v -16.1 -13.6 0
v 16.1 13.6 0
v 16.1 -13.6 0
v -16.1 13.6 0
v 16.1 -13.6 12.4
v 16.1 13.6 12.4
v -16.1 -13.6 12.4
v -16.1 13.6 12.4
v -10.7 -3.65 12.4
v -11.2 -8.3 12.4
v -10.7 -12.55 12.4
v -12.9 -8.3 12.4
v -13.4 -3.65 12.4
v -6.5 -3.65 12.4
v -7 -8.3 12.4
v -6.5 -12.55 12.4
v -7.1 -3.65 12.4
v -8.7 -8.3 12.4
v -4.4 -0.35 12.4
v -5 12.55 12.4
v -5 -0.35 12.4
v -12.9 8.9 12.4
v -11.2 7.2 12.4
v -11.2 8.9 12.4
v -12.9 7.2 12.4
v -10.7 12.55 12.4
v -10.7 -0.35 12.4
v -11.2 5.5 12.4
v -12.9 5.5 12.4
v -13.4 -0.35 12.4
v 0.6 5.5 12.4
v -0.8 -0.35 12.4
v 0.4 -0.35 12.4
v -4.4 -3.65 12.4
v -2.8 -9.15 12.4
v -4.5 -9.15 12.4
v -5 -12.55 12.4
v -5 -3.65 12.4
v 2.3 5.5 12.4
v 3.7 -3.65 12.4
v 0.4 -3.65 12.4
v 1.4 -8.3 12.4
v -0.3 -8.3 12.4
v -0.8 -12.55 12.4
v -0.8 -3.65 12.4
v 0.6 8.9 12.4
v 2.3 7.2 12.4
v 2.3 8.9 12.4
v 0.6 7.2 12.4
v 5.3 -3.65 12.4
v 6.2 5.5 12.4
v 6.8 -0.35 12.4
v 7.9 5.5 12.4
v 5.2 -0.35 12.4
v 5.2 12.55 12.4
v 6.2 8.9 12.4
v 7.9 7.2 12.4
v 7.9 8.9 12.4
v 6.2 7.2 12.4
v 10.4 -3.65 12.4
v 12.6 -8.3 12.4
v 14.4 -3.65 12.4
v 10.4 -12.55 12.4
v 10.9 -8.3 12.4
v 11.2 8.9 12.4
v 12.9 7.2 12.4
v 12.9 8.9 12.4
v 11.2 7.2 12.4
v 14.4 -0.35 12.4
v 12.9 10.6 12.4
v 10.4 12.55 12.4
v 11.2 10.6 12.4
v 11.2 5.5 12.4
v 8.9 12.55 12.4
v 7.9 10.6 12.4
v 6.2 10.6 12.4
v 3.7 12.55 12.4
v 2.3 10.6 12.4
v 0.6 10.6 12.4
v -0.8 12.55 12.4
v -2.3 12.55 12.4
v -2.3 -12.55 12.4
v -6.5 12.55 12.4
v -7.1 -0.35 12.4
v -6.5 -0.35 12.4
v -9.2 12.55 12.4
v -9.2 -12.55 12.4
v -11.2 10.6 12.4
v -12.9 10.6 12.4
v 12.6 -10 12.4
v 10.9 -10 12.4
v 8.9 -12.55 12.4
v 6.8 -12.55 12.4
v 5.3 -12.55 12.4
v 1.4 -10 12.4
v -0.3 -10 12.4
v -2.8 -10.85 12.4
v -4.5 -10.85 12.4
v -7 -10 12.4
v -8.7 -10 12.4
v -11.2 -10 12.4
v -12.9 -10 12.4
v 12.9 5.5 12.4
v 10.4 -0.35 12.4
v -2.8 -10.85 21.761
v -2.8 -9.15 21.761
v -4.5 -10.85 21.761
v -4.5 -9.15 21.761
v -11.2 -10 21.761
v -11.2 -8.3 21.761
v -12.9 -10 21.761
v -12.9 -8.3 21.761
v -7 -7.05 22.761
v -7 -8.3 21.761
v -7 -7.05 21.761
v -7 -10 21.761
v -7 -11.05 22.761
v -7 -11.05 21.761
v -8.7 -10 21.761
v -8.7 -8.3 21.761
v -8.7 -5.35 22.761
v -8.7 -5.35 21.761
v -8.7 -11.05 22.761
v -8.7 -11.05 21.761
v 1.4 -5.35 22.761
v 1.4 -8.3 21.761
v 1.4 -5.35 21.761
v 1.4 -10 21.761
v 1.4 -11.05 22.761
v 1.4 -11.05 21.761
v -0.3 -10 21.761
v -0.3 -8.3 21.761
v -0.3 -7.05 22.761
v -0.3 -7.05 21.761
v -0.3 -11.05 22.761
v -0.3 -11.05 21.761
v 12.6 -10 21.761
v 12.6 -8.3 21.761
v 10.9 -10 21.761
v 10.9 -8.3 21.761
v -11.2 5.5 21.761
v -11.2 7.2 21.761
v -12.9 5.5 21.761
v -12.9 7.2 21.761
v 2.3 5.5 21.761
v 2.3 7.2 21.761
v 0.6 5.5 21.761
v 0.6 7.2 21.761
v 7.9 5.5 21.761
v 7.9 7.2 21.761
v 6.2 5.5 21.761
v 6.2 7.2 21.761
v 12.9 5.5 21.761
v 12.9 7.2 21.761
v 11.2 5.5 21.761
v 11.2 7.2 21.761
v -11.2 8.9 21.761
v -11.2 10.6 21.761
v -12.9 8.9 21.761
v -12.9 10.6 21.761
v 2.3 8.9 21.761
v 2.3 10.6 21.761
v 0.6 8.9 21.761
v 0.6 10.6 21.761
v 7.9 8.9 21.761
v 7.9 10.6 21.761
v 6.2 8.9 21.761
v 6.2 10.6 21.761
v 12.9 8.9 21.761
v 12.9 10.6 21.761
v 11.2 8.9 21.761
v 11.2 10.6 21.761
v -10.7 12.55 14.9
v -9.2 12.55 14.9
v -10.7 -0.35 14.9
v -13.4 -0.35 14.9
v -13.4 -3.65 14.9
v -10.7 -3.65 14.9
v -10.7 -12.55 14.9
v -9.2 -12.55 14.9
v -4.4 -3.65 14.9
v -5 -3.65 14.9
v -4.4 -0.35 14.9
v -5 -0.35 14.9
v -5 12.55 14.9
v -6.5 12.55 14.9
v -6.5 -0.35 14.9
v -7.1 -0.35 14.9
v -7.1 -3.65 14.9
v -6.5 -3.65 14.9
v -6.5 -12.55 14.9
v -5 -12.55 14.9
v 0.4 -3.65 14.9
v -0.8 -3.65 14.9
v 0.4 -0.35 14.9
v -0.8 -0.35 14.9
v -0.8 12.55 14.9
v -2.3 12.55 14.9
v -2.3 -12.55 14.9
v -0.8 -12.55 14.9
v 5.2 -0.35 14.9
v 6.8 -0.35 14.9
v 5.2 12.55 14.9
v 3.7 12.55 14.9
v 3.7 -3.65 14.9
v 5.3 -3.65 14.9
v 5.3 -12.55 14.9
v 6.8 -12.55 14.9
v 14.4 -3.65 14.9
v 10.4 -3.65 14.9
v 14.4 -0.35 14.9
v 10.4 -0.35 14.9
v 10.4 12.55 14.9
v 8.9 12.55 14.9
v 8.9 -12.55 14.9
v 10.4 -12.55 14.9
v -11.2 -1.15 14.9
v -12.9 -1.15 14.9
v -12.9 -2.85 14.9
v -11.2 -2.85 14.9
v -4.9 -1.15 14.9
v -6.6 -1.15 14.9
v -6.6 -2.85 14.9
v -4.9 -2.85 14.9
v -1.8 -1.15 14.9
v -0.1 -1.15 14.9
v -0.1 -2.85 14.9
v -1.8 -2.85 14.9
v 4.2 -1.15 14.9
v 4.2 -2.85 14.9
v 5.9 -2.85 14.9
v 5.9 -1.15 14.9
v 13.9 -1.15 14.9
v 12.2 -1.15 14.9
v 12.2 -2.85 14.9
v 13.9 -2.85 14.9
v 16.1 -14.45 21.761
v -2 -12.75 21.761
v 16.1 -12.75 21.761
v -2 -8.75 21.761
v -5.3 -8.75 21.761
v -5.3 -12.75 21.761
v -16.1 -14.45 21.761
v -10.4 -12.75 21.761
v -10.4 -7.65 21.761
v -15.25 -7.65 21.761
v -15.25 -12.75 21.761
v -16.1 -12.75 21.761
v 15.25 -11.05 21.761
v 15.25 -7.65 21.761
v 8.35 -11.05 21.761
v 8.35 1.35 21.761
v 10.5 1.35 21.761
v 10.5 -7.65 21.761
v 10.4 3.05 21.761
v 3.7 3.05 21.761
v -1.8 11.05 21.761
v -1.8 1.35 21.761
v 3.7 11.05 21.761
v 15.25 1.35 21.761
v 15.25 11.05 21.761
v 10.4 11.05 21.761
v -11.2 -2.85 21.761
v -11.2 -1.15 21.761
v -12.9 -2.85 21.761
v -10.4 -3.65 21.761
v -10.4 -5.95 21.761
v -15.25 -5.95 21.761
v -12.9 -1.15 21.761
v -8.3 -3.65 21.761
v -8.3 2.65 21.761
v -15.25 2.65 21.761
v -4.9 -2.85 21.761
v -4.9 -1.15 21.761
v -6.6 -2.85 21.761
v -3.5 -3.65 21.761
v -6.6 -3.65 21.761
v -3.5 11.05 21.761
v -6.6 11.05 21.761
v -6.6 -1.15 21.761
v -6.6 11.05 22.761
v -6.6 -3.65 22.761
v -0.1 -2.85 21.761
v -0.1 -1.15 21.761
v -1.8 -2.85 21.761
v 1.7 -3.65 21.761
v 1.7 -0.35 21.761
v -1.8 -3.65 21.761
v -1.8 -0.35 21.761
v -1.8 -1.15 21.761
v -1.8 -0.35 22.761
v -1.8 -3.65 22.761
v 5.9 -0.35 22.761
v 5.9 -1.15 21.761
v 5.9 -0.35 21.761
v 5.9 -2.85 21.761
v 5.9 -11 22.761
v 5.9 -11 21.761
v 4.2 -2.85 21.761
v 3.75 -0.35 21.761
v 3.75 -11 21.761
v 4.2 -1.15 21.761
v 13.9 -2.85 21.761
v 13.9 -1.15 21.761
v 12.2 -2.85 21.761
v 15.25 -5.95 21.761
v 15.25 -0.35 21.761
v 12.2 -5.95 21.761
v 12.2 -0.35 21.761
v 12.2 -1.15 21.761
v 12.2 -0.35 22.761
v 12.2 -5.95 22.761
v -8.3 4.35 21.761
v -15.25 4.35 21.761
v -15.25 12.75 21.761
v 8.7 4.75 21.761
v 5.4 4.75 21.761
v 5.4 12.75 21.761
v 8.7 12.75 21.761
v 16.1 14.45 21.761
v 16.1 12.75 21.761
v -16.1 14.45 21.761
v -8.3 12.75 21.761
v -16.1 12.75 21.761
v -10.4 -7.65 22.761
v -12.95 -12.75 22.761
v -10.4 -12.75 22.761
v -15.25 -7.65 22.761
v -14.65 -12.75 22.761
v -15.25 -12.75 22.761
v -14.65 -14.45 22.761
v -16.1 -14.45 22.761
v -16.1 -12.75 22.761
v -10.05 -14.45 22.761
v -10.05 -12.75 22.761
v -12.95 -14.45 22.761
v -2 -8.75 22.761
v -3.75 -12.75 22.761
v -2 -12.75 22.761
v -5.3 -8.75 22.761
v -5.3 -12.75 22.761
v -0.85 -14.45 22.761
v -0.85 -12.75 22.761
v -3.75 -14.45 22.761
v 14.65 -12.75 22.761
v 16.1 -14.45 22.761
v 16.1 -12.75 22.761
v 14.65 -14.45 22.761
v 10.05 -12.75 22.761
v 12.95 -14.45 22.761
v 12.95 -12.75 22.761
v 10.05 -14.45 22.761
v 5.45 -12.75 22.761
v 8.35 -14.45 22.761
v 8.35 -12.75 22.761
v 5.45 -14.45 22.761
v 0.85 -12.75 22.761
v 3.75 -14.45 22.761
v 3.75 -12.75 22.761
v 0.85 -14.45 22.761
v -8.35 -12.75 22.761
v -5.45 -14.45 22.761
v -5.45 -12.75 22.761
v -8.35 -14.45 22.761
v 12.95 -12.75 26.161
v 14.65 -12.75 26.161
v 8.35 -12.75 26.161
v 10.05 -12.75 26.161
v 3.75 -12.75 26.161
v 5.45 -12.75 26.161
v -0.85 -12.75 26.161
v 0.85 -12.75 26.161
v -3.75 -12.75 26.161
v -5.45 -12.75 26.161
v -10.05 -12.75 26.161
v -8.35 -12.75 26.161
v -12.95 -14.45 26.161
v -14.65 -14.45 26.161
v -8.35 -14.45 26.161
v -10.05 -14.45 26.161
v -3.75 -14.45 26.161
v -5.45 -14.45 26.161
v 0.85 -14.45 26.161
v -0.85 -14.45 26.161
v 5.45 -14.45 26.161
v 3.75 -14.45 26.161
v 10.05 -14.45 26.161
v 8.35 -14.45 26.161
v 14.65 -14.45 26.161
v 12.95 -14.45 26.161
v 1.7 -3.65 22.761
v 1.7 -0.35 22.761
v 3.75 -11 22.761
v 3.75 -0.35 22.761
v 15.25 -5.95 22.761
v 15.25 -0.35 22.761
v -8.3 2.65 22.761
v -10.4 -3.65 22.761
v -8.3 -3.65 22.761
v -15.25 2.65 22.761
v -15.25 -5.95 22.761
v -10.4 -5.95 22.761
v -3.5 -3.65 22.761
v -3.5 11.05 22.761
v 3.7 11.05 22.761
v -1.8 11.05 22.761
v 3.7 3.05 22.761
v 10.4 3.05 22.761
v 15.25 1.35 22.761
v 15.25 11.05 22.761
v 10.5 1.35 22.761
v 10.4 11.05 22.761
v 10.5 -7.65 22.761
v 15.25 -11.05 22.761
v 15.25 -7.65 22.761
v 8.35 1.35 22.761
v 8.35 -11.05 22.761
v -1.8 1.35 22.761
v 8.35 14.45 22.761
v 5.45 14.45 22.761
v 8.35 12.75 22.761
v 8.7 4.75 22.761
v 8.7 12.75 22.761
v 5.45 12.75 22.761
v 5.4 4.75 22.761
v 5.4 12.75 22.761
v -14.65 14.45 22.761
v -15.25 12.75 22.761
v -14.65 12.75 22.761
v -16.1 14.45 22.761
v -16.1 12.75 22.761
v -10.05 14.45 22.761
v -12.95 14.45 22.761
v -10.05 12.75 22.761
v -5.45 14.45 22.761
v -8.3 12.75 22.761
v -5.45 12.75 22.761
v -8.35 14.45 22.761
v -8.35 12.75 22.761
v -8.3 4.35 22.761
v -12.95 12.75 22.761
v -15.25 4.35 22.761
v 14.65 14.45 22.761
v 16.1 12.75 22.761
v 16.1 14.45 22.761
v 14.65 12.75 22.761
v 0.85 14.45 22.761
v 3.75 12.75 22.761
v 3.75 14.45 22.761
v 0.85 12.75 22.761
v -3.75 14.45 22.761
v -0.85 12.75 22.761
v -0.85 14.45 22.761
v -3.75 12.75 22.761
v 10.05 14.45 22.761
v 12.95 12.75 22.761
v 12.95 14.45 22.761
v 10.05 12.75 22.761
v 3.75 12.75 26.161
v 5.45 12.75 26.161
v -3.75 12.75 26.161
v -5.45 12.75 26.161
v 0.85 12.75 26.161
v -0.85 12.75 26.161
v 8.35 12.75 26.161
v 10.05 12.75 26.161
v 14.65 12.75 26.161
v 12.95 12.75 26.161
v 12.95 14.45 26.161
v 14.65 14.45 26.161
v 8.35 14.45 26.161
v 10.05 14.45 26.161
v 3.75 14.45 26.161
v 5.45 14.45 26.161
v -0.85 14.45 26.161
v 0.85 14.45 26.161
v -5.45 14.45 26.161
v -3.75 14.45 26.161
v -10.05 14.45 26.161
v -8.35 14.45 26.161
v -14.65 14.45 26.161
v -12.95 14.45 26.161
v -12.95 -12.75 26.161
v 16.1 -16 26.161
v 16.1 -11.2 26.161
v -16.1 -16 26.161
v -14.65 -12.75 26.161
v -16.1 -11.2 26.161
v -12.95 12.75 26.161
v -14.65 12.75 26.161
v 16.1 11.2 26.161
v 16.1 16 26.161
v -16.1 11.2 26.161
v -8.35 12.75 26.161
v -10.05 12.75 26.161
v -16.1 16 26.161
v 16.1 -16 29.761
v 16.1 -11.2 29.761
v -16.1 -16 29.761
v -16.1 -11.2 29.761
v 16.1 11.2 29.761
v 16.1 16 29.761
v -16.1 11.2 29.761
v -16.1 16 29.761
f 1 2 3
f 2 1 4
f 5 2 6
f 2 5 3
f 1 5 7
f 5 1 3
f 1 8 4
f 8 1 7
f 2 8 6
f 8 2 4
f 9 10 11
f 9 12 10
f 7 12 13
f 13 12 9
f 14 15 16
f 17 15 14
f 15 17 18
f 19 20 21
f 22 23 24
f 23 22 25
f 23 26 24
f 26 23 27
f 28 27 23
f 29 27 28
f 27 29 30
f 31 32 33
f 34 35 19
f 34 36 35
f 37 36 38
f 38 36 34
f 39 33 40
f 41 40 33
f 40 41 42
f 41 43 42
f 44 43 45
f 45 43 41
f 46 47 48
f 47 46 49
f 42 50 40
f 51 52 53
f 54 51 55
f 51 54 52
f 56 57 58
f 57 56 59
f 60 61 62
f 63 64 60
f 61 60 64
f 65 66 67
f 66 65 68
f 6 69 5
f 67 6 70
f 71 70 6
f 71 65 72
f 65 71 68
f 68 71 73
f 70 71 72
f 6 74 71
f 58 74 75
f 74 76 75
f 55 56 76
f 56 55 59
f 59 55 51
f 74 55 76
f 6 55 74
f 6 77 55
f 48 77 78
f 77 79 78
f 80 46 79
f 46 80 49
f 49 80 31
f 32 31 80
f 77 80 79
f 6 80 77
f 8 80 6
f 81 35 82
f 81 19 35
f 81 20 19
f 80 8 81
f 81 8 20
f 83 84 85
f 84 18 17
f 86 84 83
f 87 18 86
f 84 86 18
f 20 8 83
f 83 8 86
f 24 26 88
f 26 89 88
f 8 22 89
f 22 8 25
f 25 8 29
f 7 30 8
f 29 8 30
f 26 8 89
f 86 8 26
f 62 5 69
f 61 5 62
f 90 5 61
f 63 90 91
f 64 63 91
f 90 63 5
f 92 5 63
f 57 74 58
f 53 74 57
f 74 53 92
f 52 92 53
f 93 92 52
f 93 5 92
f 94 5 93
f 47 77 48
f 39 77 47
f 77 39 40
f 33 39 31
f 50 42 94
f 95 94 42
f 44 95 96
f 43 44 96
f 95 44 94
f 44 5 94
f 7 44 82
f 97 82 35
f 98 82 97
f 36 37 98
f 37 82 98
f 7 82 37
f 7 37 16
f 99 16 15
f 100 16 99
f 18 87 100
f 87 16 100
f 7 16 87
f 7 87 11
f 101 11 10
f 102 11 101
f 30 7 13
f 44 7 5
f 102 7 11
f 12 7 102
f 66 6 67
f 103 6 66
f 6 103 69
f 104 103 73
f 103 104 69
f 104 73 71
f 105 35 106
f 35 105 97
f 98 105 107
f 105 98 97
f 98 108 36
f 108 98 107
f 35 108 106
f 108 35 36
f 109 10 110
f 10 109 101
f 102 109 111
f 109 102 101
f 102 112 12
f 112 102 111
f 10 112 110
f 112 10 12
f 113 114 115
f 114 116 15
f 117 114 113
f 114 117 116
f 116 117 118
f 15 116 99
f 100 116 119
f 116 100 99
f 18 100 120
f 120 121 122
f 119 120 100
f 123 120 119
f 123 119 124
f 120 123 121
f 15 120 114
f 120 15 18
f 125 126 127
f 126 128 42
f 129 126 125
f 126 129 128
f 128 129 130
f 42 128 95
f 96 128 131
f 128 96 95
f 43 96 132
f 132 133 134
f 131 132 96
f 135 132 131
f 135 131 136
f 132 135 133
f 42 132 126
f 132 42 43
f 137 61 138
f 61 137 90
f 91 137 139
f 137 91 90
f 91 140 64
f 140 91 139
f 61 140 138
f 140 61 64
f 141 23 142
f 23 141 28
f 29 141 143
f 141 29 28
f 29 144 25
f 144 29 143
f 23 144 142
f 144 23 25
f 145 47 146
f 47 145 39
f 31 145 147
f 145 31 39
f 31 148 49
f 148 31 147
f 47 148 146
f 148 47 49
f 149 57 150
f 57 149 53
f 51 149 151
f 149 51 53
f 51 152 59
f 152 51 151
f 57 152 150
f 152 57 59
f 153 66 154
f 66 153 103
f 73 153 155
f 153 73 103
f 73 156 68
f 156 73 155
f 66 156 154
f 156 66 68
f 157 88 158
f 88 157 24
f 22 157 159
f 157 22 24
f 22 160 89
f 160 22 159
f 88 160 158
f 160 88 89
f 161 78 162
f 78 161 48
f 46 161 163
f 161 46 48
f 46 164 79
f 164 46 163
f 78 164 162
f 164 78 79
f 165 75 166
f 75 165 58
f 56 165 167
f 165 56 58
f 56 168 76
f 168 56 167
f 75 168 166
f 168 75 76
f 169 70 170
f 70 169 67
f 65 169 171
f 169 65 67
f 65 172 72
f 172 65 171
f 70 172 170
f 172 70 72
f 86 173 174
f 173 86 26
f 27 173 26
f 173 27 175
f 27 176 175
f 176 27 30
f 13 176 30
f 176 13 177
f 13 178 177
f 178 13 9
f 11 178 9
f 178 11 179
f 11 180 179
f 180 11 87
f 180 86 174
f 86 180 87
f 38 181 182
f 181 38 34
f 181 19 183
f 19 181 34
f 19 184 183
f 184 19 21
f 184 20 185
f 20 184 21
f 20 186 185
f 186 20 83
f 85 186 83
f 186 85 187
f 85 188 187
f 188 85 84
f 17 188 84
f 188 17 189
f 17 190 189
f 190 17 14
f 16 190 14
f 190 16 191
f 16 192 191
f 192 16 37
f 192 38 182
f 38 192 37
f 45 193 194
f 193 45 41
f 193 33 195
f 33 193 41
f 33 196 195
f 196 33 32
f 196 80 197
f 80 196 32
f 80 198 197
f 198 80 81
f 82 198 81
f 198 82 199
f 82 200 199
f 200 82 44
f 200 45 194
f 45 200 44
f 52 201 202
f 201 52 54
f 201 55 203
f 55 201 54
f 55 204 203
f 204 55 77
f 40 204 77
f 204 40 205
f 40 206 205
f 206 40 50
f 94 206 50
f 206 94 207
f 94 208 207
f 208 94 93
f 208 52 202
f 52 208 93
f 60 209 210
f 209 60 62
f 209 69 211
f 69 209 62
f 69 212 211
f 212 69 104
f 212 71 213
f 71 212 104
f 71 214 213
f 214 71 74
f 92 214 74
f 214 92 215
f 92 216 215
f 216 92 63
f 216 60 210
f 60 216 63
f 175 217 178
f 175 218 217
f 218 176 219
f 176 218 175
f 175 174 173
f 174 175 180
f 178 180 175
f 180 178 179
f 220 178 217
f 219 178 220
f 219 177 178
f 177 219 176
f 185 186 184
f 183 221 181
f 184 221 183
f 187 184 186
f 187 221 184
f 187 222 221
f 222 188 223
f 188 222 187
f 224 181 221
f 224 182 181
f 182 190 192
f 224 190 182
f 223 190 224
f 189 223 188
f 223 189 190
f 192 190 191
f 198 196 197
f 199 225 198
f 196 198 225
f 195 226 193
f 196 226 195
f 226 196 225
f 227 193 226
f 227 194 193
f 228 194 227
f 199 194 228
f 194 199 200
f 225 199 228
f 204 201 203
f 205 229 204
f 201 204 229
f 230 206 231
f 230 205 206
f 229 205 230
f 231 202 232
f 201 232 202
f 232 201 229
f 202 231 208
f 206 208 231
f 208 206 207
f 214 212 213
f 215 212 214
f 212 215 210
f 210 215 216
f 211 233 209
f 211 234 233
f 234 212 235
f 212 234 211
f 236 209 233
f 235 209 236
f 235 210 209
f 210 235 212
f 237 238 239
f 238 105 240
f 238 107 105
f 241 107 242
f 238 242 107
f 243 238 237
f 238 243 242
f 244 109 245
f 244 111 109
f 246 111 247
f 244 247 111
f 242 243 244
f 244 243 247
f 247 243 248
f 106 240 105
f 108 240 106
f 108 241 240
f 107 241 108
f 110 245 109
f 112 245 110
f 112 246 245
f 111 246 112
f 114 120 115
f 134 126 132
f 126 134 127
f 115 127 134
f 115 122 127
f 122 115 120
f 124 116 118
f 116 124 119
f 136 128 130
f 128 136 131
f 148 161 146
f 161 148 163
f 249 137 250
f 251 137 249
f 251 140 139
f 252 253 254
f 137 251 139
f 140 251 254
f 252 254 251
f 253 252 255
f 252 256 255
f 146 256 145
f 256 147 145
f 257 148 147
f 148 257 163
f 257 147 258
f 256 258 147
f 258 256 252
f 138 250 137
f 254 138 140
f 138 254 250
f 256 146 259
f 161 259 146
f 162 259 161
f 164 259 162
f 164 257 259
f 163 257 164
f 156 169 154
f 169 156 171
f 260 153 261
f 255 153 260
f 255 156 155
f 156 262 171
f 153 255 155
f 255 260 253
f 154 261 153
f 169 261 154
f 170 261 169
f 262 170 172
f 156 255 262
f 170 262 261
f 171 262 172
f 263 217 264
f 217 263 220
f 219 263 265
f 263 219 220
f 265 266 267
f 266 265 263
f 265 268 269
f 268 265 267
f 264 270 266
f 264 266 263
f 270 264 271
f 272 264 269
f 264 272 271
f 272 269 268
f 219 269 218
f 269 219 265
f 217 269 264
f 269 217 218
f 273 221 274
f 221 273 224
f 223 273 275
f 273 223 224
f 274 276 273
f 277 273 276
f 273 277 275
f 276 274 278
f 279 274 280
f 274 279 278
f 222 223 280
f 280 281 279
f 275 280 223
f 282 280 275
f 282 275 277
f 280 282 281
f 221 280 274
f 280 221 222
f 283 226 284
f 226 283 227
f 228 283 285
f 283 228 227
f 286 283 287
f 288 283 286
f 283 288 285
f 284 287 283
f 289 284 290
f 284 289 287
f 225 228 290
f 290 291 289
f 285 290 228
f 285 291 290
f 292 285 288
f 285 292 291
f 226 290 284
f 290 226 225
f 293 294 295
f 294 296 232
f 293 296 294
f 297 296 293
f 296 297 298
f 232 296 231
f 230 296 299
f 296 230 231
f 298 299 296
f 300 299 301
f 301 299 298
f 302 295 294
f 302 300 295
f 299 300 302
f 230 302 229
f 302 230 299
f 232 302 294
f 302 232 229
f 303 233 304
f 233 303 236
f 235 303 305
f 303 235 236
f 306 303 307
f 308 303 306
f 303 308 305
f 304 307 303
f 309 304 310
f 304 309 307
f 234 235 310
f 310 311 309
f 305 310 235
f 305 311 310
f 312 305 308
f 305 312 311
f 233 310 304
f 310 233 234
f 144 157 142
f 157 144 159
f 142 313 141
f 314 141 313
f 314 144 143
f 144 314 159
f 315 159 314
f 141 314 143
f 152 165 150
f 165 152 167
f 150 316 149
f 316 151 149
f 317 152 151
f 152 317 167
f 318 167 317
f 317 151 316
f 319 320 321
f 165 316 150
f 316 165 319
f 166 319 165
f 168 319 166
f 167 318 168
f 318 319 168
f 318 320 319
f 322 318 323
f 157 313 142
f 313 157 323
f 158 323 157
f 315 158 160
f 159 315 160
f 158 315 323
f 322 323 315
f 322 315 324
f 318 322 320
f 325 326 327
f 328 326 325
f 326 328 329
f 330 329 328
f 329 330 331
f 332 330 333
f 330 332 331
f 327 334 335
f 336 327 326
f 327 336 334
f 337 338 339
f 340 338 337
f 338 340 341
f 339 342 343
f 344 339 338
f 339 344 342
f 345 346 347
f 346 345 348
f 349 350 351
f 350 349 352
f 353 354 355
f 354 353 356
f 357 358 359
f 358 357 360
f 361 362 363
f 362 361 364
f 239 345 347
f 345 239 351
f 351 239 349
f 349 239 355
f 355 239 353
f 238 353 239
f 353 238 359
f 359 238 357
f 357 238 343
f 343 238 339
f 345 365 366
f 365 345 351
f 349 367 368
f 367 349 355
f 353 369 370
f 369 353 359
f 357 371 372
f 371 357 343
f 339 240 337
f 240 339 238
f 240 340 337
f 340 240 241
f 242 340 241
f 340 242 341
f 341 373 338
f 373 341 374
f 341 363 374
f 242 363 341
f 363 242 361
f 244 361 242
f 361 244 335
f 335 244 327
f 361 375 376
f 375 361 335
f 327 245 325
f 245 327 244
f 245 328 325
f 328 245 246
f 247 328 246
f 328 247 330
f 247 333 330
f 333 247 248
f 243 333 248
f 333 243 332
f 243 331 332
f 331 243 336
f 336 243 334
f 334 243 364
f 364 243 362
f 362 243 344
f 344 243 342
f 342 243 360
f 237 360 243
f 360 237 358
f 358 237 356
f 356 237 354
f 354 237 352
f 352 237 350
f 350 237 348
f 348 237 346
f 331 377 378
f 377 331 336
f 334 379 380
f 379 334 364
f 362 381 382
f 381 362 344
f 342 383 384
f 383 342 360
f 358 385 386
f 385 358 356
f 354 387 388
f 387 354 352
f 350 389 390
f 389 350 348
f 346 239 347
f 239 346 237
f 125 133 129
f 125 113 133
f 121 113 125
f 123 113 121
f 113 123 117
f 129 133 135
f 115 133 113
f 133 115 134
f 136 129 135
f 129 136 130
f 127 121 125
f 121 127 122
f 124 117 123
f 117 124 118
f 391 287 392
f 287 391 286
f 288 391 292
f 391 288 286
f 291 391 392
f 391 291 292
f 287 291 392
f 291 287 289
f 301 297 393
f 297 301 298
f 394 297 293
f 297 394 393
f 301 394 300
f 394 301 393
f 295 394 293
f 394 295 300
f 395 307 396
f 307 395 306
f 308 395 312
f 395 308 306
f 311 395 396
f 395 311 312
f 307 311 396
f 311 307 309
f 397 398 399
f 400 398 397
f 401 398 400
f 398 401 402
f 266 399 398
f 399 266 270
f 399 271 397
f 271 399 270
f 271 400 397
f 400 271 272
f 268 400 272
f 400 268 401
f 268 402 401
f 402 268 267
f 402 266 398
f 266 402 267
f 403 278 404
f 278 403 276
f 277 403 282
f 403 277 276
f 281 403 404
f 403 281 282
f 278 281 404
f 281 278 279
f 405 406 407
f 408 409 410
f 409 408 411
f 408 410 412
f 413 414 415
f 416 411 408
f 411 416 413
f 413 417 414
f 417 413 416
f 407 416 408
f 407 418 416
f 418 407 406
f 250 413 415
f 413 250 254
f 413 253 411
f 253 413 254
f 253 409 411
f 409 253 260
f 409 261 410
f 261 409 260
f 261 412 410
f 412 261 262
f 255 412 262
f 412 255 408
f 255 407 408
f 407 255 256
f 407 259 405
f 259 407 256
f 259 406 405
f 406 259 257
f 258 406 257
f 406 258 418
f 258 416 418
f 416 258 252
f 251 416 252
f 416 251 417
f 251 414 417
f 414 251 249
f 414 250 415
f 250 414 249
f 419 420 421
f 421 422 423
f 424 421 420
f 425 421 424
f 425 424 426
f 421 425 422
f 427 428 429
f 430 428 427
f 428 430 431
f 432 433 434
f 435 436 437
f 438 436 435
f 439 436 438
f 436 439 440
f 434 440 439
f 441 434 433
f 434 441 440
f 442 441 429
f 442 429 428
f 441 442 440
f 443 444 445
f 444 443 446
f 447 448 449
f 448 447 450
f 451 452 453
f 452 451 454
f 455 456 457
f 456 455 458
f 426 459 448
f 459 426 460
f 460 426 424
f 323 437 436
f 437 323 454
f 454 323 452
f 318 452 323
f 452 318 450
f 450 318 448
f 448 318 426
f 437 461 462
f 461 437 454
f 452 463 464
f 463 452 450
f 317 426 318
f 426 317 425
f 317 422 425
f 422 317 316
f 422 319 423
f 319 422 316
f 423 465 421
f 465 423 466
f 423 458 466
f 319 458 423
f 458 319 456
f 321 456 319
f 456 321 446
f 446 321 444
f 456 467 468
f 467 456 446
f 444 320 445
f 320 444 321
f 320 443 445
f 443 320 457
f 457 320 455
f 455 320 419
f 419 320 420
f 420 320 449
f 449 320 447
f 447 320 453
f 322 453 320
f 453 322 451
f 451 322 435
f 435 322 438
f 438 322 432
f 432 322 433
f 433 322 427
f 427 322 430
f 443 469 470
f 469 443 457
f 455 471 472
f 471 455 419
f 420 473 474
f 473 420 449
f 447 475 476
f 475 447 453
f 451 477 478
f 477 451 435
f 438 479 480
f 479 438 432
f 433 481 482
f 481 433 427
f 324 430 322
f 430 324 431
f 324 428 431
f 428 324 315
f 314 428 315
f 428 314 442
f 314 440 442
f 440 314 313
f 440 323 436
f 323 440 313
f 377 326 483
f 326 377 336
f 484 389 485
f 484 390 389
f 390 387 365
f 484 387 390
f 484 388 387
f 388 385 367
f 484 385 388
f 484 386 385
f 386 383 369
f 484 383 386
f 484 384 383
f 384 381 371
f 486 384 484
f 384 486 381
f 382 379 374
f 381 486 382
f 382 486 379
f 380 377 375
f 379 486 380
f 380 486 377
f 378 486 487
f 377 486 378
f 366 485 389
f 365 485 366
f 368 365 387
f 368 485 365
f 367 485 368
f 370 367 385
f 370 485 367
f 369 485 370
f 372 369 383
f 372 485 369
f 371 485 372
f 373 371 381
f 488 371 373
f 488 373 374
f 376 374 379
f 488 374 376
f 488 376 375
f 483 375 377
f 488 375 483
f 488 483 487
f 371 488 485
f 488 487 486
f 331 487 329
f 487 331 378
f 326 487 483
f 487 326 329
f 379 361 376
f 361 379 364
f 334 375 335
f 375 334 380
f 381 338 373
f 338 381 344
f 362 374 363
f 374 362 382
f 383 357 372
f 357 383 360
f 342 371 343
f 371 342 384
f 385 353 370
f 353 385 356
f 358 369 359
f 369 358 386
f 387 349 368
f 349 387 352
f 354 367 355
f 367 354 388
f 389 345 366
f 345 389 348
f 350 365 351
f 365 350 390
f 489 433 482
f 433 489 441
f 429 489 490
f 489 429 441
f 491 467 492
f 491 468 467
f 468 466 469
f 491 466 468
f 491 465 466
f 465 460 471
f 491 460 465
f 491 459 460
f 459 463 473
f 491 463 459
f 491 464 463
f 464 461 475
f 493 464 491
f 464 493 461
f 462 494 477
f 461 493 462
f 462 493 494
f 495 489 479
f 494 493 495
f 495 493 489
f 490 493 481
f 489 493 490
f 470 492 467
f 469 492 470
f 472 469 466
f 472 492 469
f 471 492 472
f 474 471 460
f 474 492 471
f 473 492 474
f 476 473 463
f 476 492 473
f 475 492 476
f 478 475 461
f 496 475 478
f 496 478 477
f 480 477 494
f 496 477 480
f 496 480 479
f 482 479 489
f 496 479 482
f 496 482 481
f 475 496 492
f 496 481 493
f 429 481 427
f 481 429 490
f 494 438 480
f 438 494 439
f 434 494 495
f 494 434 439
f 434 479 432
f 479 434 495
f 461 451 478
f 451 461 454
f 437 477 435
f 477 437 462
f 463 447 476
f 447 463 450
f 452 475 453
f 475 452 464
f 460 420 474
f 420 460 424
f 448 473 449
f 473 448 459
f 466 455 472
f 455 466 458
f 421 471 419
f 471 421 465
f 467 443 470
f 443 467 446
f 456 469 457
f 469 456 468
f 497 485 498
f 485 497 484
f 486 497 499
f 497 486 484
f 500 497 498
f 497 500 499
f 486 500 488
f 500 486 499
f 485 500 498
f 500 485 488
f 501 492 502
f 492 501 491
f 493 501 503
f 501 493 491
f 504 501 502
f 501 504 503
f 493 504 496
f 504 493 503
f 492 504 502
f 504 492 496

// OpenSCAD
// Generated by SolidPython 0.4.2 on 2020-09-29 23:21:57
//!OpenSCAD

scale(v = 0.0100000000) {
	translate(v = [-1610, -1360, 0]) {
		union() {
			color(c = [0.4000000000, 0.4000000000, 0.4000000000]) {
				translate(v = [0, 0, 0]) {
					linear_extrude(height = 1000.0000000000) {
						polygon(paths = [[0, 1, 2, 3]], points = [[0, 0], [0, 2720], [3220, 2720], [3220, 0]]);
					}
				}
			}
			color(c = [0.2000000000, 0.6000000000, 0.2000000000]) {
				translate(v = [0, 0, 1000.0000000000]) {
					linear_extrude(height = 120.0000000000) {
						polygon(paths = [[0, 1, 2, 3]], points = [[0, 1305], [0, 2720], [3220, 2720], [3220, 1305]]);
					}
				}
			}
			color(c = [0.4000000000, 0.4000000000, 0.4000000000]) {
				translate(v = [0, 0, 1000.0000000000]) {
					linear_extrude(height = 120.0000000000) {
						polygon(paths = [[0, 1, 2, 3]], points = [[0, 0], [0, 1305], [3220, 1305], [3220, 0]]);
					}
				}
			}
			color(c = [0.9000000000, 0.6000000000, 0.6000000000]) {
				translate(v = [0, 0, 1120.0000000000]) {
					linear_extrude(height = 120.0000000000) {
						polygon(paths = [[0, 1, 2, 3]], points = [[260, 1845], [260, 2485], [540, 2485], [540, 1845]]);
					}
				}
			}
			color(c = [0.9000000000, 0.6000000000, 0.6000000000]) {
				translate(v = [0, 0, 1120.0000000000]) {
					linear_extrude(height = 120.0000000000) {
						polygon(paths = [[0, 1, 2, 3]], points = [[690, 1845], [690, 2485], [960, 2485], [960, 1845]]);
					}
				}
			}
			color(c = [0.9000000000, 0.6000000000, 0.6000000000]) {
				translate(v = [0, 0, 1120.0000000000]) {
					linear_extrude(height = 120.0000000000) {
						polygon(paths = [[0, 1, 2, 3]], points = [[1110, 1845], [1110, 2485], [1380, 2485], [1380, 1845]]);
					}
				}
			}
			color(c = [0.9000000000, 0.6000000000, 0.6000000000]) {
				translate(v = [0, 0, 1120.0000000000]) {
					linear_extrude(height = 120.0000000000) {
						polygon(paths = [[0, 1, 2, 3]], points = [[1530, 1845], [1530, 2485], [1980, 2485], [1980, 1845]]);
					}
				}
			}
			color(c = [0.9000000000, 0.6000000000, 0.6000000000]) {
				translate(v = [0, 0, 1120.0000000000]) {
					linear_extrude(height = 120.0000000000) {
						polygon(paths = [[0, 1, 2, 3]], points = [[2130, 1845], [2130, 2485], [2500, 2485], [2500, 1845]]);
					}
				}
			}
			color(c = [0.9000000000, 0.6000000000, 0.6000000000]) {
				translate(v = [0, 0, 1120.0000000000]) {
					linear_extrude(height = 120.0000000000) {
						polygon(paths = [[0, 1, 2, 3]], points = [[2650, 1845], [2650, 2485], [2960, 2485], [2960, 1845]]);
					}
				}
			}
			color(c = [0.9000000000, 0.6000000000, 0.9000000000]) {
				translate(v = [0, 0, 1120.0000000000]) {
					linear_extrude(height = 120.0000000000) {
						polygon(paths = [[0, 1, 2, 3]], points = [[260, 235], [260, 655], [540, 655], [540, 235]]);
					}
				}
			}
			color(c = [0.9000000000, 0.6000000000, 0.9000000000]) {
				translate(v = [0, 0, 1120.0000000000]) {
					linear_extrude(height = 120.0000000000) {
						polygon(paths = [[0, 1, 2, 3]], points = [[690, 235], [690, 655], [960, 655], [960, 235]]);
					}
				}
			}
			color(c = [0.9000000000, 0.6000000000, 0.9000000000]) {
				translate(v = [0, 0, 1120.0000000000]) {
					linear_extrude(height = 120.0000000000) {
						polygon(paths = [[0, 1, 2, 3]], points = [[1110, 235], [1110, 655], [1380, 655], [1380, 235]]);
					}
				}
			}
			color(c = [0.9000000000, 0.6000000000, 0.9000000000]) {
				translate(v = [0, 0, 1120.0000000000]) {
					linear_extrude(height = 120.0000000000) {
						polygon(paths = [[0, 1, 2, 3]], points = [[1530, 235], [1530, 655], [2140, 655], [2140, 235]]);
					}
				}
			}
			color(c = [0.9000000000, 0.6000000000, 0.9000000000]) {
				translate(v = [0, 0, 1120.0000000000]) {
					linear_extrude(height = 120.0000000000) {
						polygon(paths = [[0, 1, 2, 3]], points = [[2290, 235], [2290, 655], [2500, 655], [2500, 235]]);
					}
				}
			}
			color(c = [0.9000000000, 0.6000000000, 0.9000000000]) {
				translate(v = [0, 0, 1120.0000000000]) {
					linear_extrude(height = 120.0000000000) {
						polygon(paths = [[0, 1, 2, 3]], points = [[2650, 235], [2650, 655], [2930, 655], [2930, 235]]);
					}
				}
			}
			color(c = [0.2000000000, 0.6000000000, 0.2000000000]) {
				translate(v = [0, 0, 1120.0000000000]) {
					linear_extrude(height = 120.0000000000) {
						difference() {
							polygon(paths = [[0, 1, 2, 3]], points = [[0, 1305], [0, 2720], [3220, 2720], [3220, 1305]]);
							polygon(paths = [[0, 1, 2, 3]], points = [[260, 1845], [540, 1845], [540, 2485], [260, 2485]]);
							polygon(paths = [[0, 1, 2, 3]], points = [[690, 1845], [960, 1845], [960, 2485], [690, 2485]]);
							polygon(paths = [[0, 1, 2, 3]], points = [[1110, 1845], [1380, 1845], [1380, 2485], [1110, 2485]]);
							polygon(paths = [[0, 1, 2, 3]], points = [[1530, 1845], [1980, 1845], [1980, 2485], [1530, 2485]]);
							polygon(paths = [[0, 1, 2, 3]], points = [[2130, 1845], [2500, 1845], [2500, 2485], [2130, 2485]]);
							polygon(paths = [[0, 1, 2, 3]], points = [[2650, 1845], [2960, 1845], [2960, 2485], [2650, 2485]]);
						}
					}
				}
			}
			color(c = [0.4000000000, 0.4000000000, 0.4000000000]) {
				translate(v = [0, 0, 1120.0000000000]) {
					linear_extrude(height = 120.0000000000) {
						difference() {
							polygon(paths = [[0, 1, 2, 3]], points = [[0, 0], [0, 1305], [3220, 1305], [3220, 0]]);
							polygon(paths = [[0, 1, 2, 3]], points = [[260, 235], [540, 235], [540, 655], [260, 655]]);
							polygon(paths = [[0, 1, 2, 3]], points = [[690, 235], [960, 235], [960, 655], [690, 655]]);
							polygon(paths = [[0, 1, 2, 3]], points = [[1110, 235], [1380, 235], [1380, 655], [1110, 655]]);
							polygon(paths = [[0, 1, 2, 3]], points = [[1530, 235], [2140, 235], [2140, 655], [1530, 655]]);
							polygon(paths = [[0, 1, 2, 3]], points = [[2290, 235], [2500, 235], [2500, 655], [2290, 655]]);
							polygon(paths = [[0, 1, 2, 3]], points = [[2650, 235], [2930, 235], [2930, 655], [2650, 655]]);
						}
					}
				}
			}
			color(c = [0.1000000000, 0.1000000000, 0.1000000000]) {
				translate(v = [0, 0, 1240.0000000000]) {
					linear_extrude(height = 70.0000000000) {
						polygon(paths = [[0, 1, 2, 3]], points = [[1160, 275], [1160, 445], [1330, 445], [1330, 275]]);
					}
				}
			}
			color(c = [0.1000000000, 0.1000000000, 0.1000000000]) {
				translate(v = [0, 0, 1240.0000000000]) {
					linear_extrude(height = 70.0000000000) {
						polygon(paths = [[0, 1, 2, 3]], points = [[320, 360], [320, 530], [490, 530], [490, 360]]);
					}
				}
			}
			color(c = [0.1000000000, 0.1000000000, 0.1000000000]) {
				translate(v = [0, 0, 1240.0000000000]) {
					linear_extrude(height = 70.0000000000) {
						polygon(paths = [[0, 1, 2, 3]], points = [[740, 360], [740, 530], [910, 530], [910, 360]]);
					}
				}
			}
			color(c = [0.1000000000, 0.1000000000, 0.1000000000]) {
				translate(v = [0, 0, 1240.0000000000]) {
					linear_extrude(height = 70.0000000000) {
						polygon(paths = [[0, 1, 2, 3]], points = [[1580, 360], [1580, 530], [1750, 530], [1750, 360]]);
					}
				}
			}
			color(c = [0.1000000000, 0.1000000000, 0.1000000000]) {
				translate(v = [0, 0, 1240.0000000000]) {
					linear_extrude(height = 70.0000000000) {
						polygon(paths = [[0, 1, 2, 3]], points = [[2700, 360], [2700, 530], [2870, 530], [2870, 360]]);
					}
				}
			}
			color(c = [0.1000000000, 0.1000000000, 0.1000000000]) {
				translate(v = [0, 0, 1240.0000000000]) {
					linear_extrude(height = 70.0000000000) {
						polygon(paths = [[0, 1, 2, 3]], points = [[320, 1910], [320, 2080], [490, 2080], [490, 1910]]);
					}
				}
			}
			color(c = [0.1000000000, 0.1000000000, 0.1000000000]) {
				translate(v = [0, 0, 1240.0000000000]) {
					linear_extrude(height = 70.0000000000) {
						polygon(paths = [[0, 1, 2, 3]], points = [[1670, 1910], [1670, 2080], [1840, 2080], [1840, 1910]]);
					}
				}
			}
			color(c = [0.1000000000, 0.1000000000, 0.1000000000]) {
				translate(v = [0, 0, 1240.0000000000]) {
					linear_extrude(height = 70.0000000000) {
						polygon(paths = [[0, 1, 2, 3]], points = [[2230, 1910], [2230, 2080], [2400, 2080], [2400, 1910]]);
					}
				}
			}
			color(c = [0.1000000000, 0.1000000000, 0.1000000000]) {
				translate(v = [0, 0, 1240.0000000000]) {
					linear_extrude(height = 70.0000000000) {
						polygon(paths = [[0, 1, 2, 3]], points = [[2730, 1910], [2730, 2080], [2900, 2080], [2900, 1910]]);
					}
				}
			}
			color(c = [0.1000000000, 0.1000000000, 0.1000000000]) {
				translate(v = [0, 0, 1240.0000000000]) {
					linear_extrude(height = 70.0000000000) {
						polygon(paths = [[0, 1, 2, 3]], points = [[320, 2250], [320, 2420], [490, 2420], [490, 2250]]);
					}
				}
			}
			color(c = [0.1000000000, 0.1000000000, 0.1000000000]) {
				translate(v = [0, 0, 1240.0000000000]) {
					linear_extrude(height = 70.0000000000) {
						polygon(paths = [[0, 1, 2, 3]], points = [[1670, 2250], [1670, 2420], [1840, 2420], [1840, 2250]]);
					}
				}
			}
			color(c = [0.1000000000, 0.1000000000, 0.1000000000]) {
				translate(v = [0, 0, 1240.0000000000]) {
					linear_extrude(height = 70.0000000000) {
						polygon(paths = [[0, 1, 2, 3]], points = [[2230, 2250], [2230, 2420], [2400, 2420], [2400, 2250]]);
					}
				}
			}
			color(c = [0.1000000000, 0.1000000000, 0.1000000000]) {
				translate(v = [0, 0, 1240.0000000000]) {
					linear_extrude(height = 70.0000000000) {
						polygon(paths = [[0, 1, 2, 3]], points = [[2730, 2250], [2730, 2420], [2900, 2420], [2900, 2250]]);
					}
				}
			}
			color(c = [1.0000000000, 1.0000000000, 1.0000000000]) {
				translate(v = [0, 0, 1240.0000000000]) {
					linear_extrude(height = 70.0000000000) {
						polygon(paths = [[0, 1, 2, 3, 4, 5, 6, 7]], points = [[540, 105], [540, 995], [270, 995], [270, 1325], [540, 1325], [540, 2615], [690, 2615], [690, 105]]);
					}
				}
			}
			color(c = [1.0000000000, 1.0000000000, 1.0000000000]) {
				translate(v = [0, 0, 1240.0000000000]) {
					linear_extrude(height = 70.0000000000) {
						polygon(paths = [[0, 1, 2, 3, 4, 5, 6, 7, 8, 9, 10, 11]], points = [[960, 105], [960, 995], [900, 995], [900, 1325], [960, 1325], [960, 2615], [1110, 2615], [1110, 1325], [1170, 1325], [1170, 995], [1110, 995], [1110, 105]]);
					}
				}
			}
			color(c = [1.0000000000, 1.0000000000, 1.0000000000]) {
				translate(v = [0, 0, 1240.0000000000]) {
					linear_extrude(height = 70.0000000000) {
						polygon(paths = [[0, 1, 2, 3, 4, 5, 6, 7]], points = [[1380, 105], [1380, 2615], [1530, 2615], [1530, 1325], [1650, 1325], [1650, 995], [1530, 995], [1530, 105]]);
					}
				}
			}
			color(c = [1.0000000000, 1.0000000000, 1.0000000000]) {
				translate(v = [0, 0, 1240.0000000000]) {
					linear_extrude(height = 70.0000000000) {
						polygon(paths = [[0, 1, 2, 3, 4, 5, 6, 7]], points = [[2140, 105], [2140, 995], [1980, 995], [1980, 2615], [2130, 2615], [2130, 1325], [2290, 1325], [2290, 105]]);
					}
				}
			}
			color(c = [1.0000000000, 1.0000000000, 1.0000000000]) {
				translate(v = [0, 0, 1240.0000000000]) {
					linear_extrude(height = 70.0000000000) {
						polygon(paths = [[0, 1, 2, 3, 4, 5, 6, 7]], points = [[2500, 105], [2500, 2615], [2650, 2615], [2650, 1325], [3050, 1325], [3050, 995], [2650, 995], [2650, 105]]);
					}
				}
			}
			color(c = [0.1000000000, 0.1000000000, 0.1000000000]) {
				translate(v = [0, 0, 1310.0000000000]) {
					linear_extrude(height = 180.0000000000) {
						polygon(paths = [[0, 1, 2, 3]], points = [[1160, 275], [1160, 445], [1330, 445], [1330, 275]]);
					}
				}
			}
			color(c = [0.1000000000, 0.1000000000, 0.1000000000]) {
				translate(v = [0, 0, 1310.0000000000]) {
					linear_extrude(height = 180.0000000000) {
						polygon(paths = [[0, 1, 2, 3]], points = [[320, 360], [320, 530], [490, 530], [490, 360]]);
					}
				}
			}
			color(c = [0.1000000000, 0.1000000000, 0.1000000000]) {
				translate(v = [0, 0, 1310.0000000000]) {
					linear_extrude(height = 180.0000000000) {
						polygon(paths = [[0, 1, 2, 3]], points = [[740, 360], [740, 530], [910, 530], [910, 360]]);
					}
				}
			}
			color(c = [0.1000000000, 0.1000000000, 0.1000000000]) {
				translate(v = [0, 0, 1310.0000000000]) {
					linear_extrude(height = 180.0000000000) {
						polygon(paths = [[0, 1, 2, 3]], points = [[1580, 360], [1580, 530], [1750, 530], [1750, 360]]);
					}
				}
			}
			color(c = [0.1000000000, 0.1000000000, 0.1000000000]) {
				translate(v = [0, 0, 1310.0000000000]) {
					linear_extrude(height = 180.0000000000) {
						polygon(paths = [[0, 1, 2, 3]], points = [[2700, 360], [2700, 530], [2870, 530], [2870, 360]]);
					}
				}
			}
			color(c = [0.1000000000, 0.1000000000, 0.1000000000]) {
				translate(v = [0, 0, 1310.0000000000]) {
					linear_extrude(height = 180.0000000000) {
						polygon(paths = [[0, 1, 2, 3]], points = [[320, 1910], [320, 2080], [490, 2080], [490, 1910]]);
					}
				}
			}
			color(c = [0.1000000000, 0.1000000000, 0.1000000000]) {
				translate(v = [0, 0, 1310.0000000000]) {
					linear_extrude(height = 180.0000000000) {
						polygon(paths = [[0, 1, 2, 3]], points = [[1670, 1910], [1670, 2080], [1840, 2080], [1840, 1910]]);
					}
				}
			}
			color(c = [0.1000000000, 0.1000000000, 0.1000000000]) {
				translate(v = [0, 0, 1310.0000000000]) {
					linear_extrude(height = 180.0000000000) {
						polygon(paths = [[0, 1, 2, 3]], points = [[2230, 1910], [2230, 2080], [2400, 2080], [2400, 1910]]);
					}
				}
			}
			color(c = [0.1000000000, 0.1000000000, 0.1000000000]) {
				translate(v = [0, 0, 1310.0000000000]) {
					linear_extrude(height = 180.0000000000) {
						polygon(paths = [[0, 1, 2, 3]], points = [[2730, 1910], [2730, 2080], [2900, 2080], [2900, 1910]]);
					}
				}
			}
			color(c = [0.1000000000, 0.1000000000, 0.1000000000]) {
				translate(v = [0, 0, 1310.0000000000]) {
					linear_extrude(height = 180.0000000000) {
						polygon(paths = [[0, 1, 2, 3]], points = [[320, 2250], [320, 2420], [490, 2420], [490, 2250]]);
					}
				}
			}
			color(c = [0.1000000000, 0.1000000000, 0.1000000000]) {
				translate(v = [0, 0, 1310.0000000000]) {
					linear_extrude(height = 180.0000000000) {
						polygon(paths = [[0, 1, 2, 3]], points = [[1670, 2250], [1670, 2420], [1840, 2420], [1840, 2250]]);
					}
				}
			}
			color(c = [0.1000000000, 0.1000000000, 0.1000000000]) {
				translate(v = [0, 0, 1310.0000000000]) {
					linear_extrude(height = 180.0000000000) {
						polygon(paths = [[0, 1, 2, 3]], points = [[2230, 2250], [2230, 2420], [2400, 2420], [2400, 2250]]);
					}
				}
			}
			color(c = [0.1000000000, 0.1000000000, 0.1000000000]) {
				translate(v = [0, 0, 1310.0000000000]) {
					linear_extrude(height = 180.0000000000) {
						polygon(paths = [[0, 1, 2, 3]], points = [[2730, 2250], [2730, 2420], [2900, 2420], [2900, 2250]]);
					}
				}
			}
			color(c = [0.7000000000, 0, 0]) {
				translate(v = [0, 0, 1310.0000000000]) {
					linear_extrude(height = 180.0000000000) {
						polygon(paths = [[0, 1, 2, 3, 4, 5, 6, 7]], points = [[540, 105], [540, 995], [270, 995], [270, 1325], [540, 1325], [540, 2615], [690, 2615], [690, 105]]);
					}
				}
			}
			color(c = [0.7000000000, 0, 0]) {
				translate(v = [0, 0, 1310.0000000000]) {
					linear_extrude(height = 180.0000000000) {
						polygon(paths = [[0, 1, 2, 3, 4, 5, 6, 7, 8, 9, 10, 11]], points = [[960, 105], [960, 995], [900, 995], [900, 1325], [960, 1325], [960, 2615], [1110, 2615], [1110, 1325], [1170, 1325], [1170, 995], [1110, 995], [1110, 105]]);
					}
				}
			}
			color(c = [0.7000000000, 0, 0]) {
				translate(v = [0, 0, 1310.0000000000]) {
					linear_extrude(height = 180.0000000000) {
						polygon(paths = [[0, 1, 2, 3, 4, 5, 6, 7]], points = [[1380, 105], [1380, 2615], [1530, 2615], [1530, 1325], [1650, 1325], [1650, 995], [1530, 995], [1530, 105]]);
					}
				}
			}
			color(c = [0.7000000000, 0, 0]) {
				translate(v = [0, 0, 1310.0000000000]) {
					linear_extrude(height = 180.0000000000) {
						polygon(paths = [[0, 1, 2, 3, 4, 5, 6, 7]], points = [[2140, 105], [2140, 995], [1980, 995], [1980, 2615], [2130, 2615], [2130, 1325], [2290, 1325], [2290, 105]]);
					}
				}
			}
			color(c = [0.7000000000, 0, 0]) {
				translate(v = [0, 0, 1310.0000000000]) {
					linear_extrude(height = 180.0000000000) {
						polygon(paths = [[0, 1, 2, 3, 4, 5, 6, 7]], points = [[2500, 105], [2500, 2615], [2650, 2615], [2650, 1325], [3050, 1325], [3050, 995], [2650, 995], [2650, 105]]);
					}
				}
			}
			color(c = [0.1000000000, 0.1000000000, 0.1000000000]) {
				translate(v = [0, 0, 1490.0000000000]) {
					linear_extrude(height = 686.1000000000) {
						polygon(paths = [[0, 1, 2, 3]], points = [[1160, 275], [1160, 445], [1330, 445], [1330, 275]]);
					}
				}
			}
			color(c = [0.1000000000, 0.1000000000, 0.1000000000]) {
				translate(v = [0, 0, 1490.0000000000]) {
					linear_extrude(height = 686.1000000000) {
						polygon(paths = [[0, 1, 2, 3]], points = [[320, 360], [320, 530], [490, 530], [490, 360]]);
					}
				}
			}
			color(c = [0.1000000000, 0.1000000000, 0.1000000000]) {
				translate(v = [0, 0, 1490.0000000000]) {
					linear_extrude(height = 686.1000000000) {
						polygon(paths = [[0, 1, 2, 3]], points = [[740, 360], [740, 530], [910, 530], [910, 360]]);
					}
				}
			}
			color(c = [0.1000000000, 0.1000000000, 0.1000000000]) {
				translate(v = [0, 0, 1490.0000000000]) {
					linear_extrude(height = 686.1000000000) {
						polygon(paths = [[0, 1, 2, 3]], points = [[1580, 360], [1580, 530], [1750, 530], [1750, 360]]);
					}
				}
			}
			color(c = [0.1000000000, 0.1000000000, 0.1000000000]) {
				translate(v = [0, 0, 1490.0000000000]) {
					linear_extrude(height = 686.1000000000) {
						polygon(paths = [[0, 1, 2, 3]], points = [[2700, 360], [2700, 530], [2870, 530], [2870, 360]]);
					}
				}
			}
			color(c = [0.1000000000, 0.1000000000, 0.1000000000]) {
				translate(v = [0, 0, 1490.0000000000]) {
					linear_extrude(height = 686.1000000000) {
						polygon(paths = [[0, 1, 2, 3]], points = [[320, 1075], [320, 1245], [490, 1245], [490, 1075]]);
					}
				}
			}
			color(c = [0.1000000000, 0.1000000000, 0.1000000000]) {
				translate(v = [0, 0, 1490.0000000000]) {
					linear_extrude(height = 686.1000000000) {
						polygon(paths = [[0, 1, 2, 3]], points = [[950, 1075], [950, 1245], [1120, 1245], [1120, 1075]]);
					}
				}
			}
			color(c = [0.1000000000, 0.1000000000, 0.1000000000]) {
				translate(v = [0, 0, 1490.0000000000]) {
					linear_extrude(height = 686.1000000000) {
						polygon(paths = [[0, 1, 2, 3]], points = [[1430, 1075], [1430, 1245], [1600, 1245], [1600, 1075]]);
					}
				}
			}
			color(c = [0.1000000000, 0.1000000000, 0.1000000000]) {
				translate(v = [0, 0, 1490.0000000000]) {
					linear_extrude(height = 686.1000000000) {
						polygon(paths = [[0, 1, 2, 3]], points = [[2030, 1075], [2030, 1245], [2200, 1245], [2200, 1075]]);
					}
				}
			}
			color(c = [0.1000000000, 0.1000000000, 0.1000000000]) {
				translate(v = [0, 0, 1490.0000000000]) {
					linear_extrude(height = 686.1000000000) {
						polygon(paths = [[0, 1, 2, 3]], points = [[2830, 1075], [2830, 1245], [3000, 1245], [3000, 1075]]);
					}
				}
			}
			color(c = [0.1000000000, 0.1000000000, 0.1000000000]) {
				translate(v = [0, 0, 1490.0000000000]) {
					linear_extrude(height = 686.1000000000) {
						polygon(paths = [[0, 1, 2, 3]], points = [[320, 1910], [320, 2080], [490, 2080], [490, 1910]]);
					}
				}
			}
			color(c = [0.1000000000, 0.1000000000, 0.1000000000]) {
				translate(v = [0, 0, 1490.0000000000]) {
					linear_extrude(height = 686.1000000000) {
						polygon(paths = [[0, 1, 2, 3]], points = [[1670, 1910], [1670, 2080], [1840, 2080], [1840, 1910]]);
					}
				}
			}
			color(c = [0.1000000000, 0.1000000000, 0.1000000000]) {
				translate(v = [0, 0, 1490.0000000000]) {
					linear_extrude(height = 686.1000000000) {
						polygon(paths = [[0, 1, 2, 3]], points = [[2230, 1910], [2230, 2080], [2400, 2080], [2400, 1910]]);
					}
				}
			}
			color(c = [0.1000000000, 0.1000000000, 0.1000000000]) {
				translate(v = [0, 0, 1490.0000000000]) {
					linear_extrude(height = 686.1000000000) {
						polygon(paths = [[0, 1, 2, 3]], points = [[2730, 1910], [2730, 2080], [2900, 2080], [2900, 1910]]);
					}
				}
			}
			color(c = [0.1000000000, 0.1000000000, 0.1000000000]) {
				translate(v = [0, 0, 1490.0000000000]) {
					linear_extrude(height = 686.1000000000) {
						polygon(paths = [[0, 1, 2, 3]], points = [[320, 2250], [320, 2420], [490, 2420], [490, 2250]]);
					}
				}
			}
			color(c = [0.1000000000, 0.1000000000, 0.1000000000]) {
				translate(v = [0, 0, 1490.0000000000]) {
					linear_extrude(height = 686.1000000000) {
						polygon(paths = [[0, 1, 2, 3]], points = [[1670, 2250], [1670, 2420], [1840, 2420], [1840, 2250]]);
					}
				}
			}
			color(c = [0.1000000000, 0.1000000000, 0.1000000000]) {
				translate(v = [0, 0, 1490.0000000000]) {
					linear_extrude(height = 686.1000000000) {
						polygon(paths = [[0, 1, 2, 3]], points = [[2230, 2250], [2230, 2420], [2400, 2420], [2400, 2250]]);
					}
				}
			}
			color(c = [0.1000000000, 0.1000000000, 0.1000000000]) {
				translate(v = [0, 0, 1490.0000000000]) {
					linear_extrude(height = 686.1000000000) {
						polygon(paths = [[0, 1, 2, 3]], points = [[2730, 2250], [2730, 2420], [2900, 2420], [2900, 2250]]);
					}
				}
			}
			color(c = [0.9000000000, 0.6000000000, 0.6000000000]) {
				translate(v = [0, 0, 2176.1000000000]) {
					linear_extrude(height = 100.0000000000) {
						polygon(paths = [[0, 1, 2, 3, 4, 5, 6, 7, 8, 9, 10, 11]], points = [[0, -85], [0, 85], [85, 85], [85, 595], [570, 595], [570, 85], [1080, 85], [1080, 485], [1410, 485], [1410, 85], [3220, 85], [3220, -85]]);
					}
				}
			}
			color(c = [0.9000000000, 0.6000000000, 0.6000000000]) {
				translate(v = [0, 0, 2176.1000000000]) {
					linear_extrude(height = 100.0000000000) {
						polygon(paths = [[0, 1, 2, 3, 4, 5, 6, 7]], points = [[740, 255], [740, 825], [1750, 825], [1750, 255], [1580, 255], [1580, 655], [910, 655], [910, 255]]);
					}
				}
			}
			color(c = [0.9000000000, 0.6000000000, 0.6000000000]) {
				translate(v = [0, 0, 2176.1000000000]) {
					linear_extrude(height = 100.0000000000) {
						polygon(paths = [[0, 1, 2, 3]], points = [[1430, 995], [1430, 1325], [1780, 1325], [1780, 995]]);
					}
				}
			}
			color(c = [0.9000000000, 0.6000000000, 0.6000000000]) {
				translate(v = [0, 0, 2176.1000000000]) {
					linear_extrude(height = 100.0000000000) {
						polygon(paths = [[0, 1, 2, 3]], points = [[1985, 260], [1985, 1325], [2200, 1325], [2200, 260]]);
					}
				}
			}
			color(c = [0.9000000000, 0.6000000000, 0.6000000000]) {
				translate(v = [0, 0, 2176.1000000000]) {
					linear_extrude(height = 100.0000000000) {
						polygon(paths = [[0, 1, 2, 3]], points = [[2830, 765], [2830, 1325], [3135, 1325], [3135, 765]]);
					}
				}
			}
			color(c = [0.9000000000, 0.6000000000, 0.6000000000]) {
				translate(v = [0, 0, 2176.1000000000]) {
					linear_extrude(height = 100.0000000000) {
						polygon(paths = [[0, 1, 2, 3, 4, 5]], points = [[85, 765], [85, 1625], [780, 1625], [780, 995], [570, 995], [570, 765]]);
					}
				}
			}
			color(c = [0.9000000000, 0.6000000000, 0.6000000000]) {
				translate(v = [0, 0, 2176.1000000000]) {
					linear_extrude(height = 100.0000000000) {
						polygon(paths = [[0, 1, 2, 3]], points = [[950, 995], [950, 2465], [1260, 2465], [1260, 995]]);
					}
				}
			}
			color(c = [0.9000000000, 0.6000000000, 0.6000000000]) {
				translate(v = [0, 0, 2176.1000000000]) {
					linear_extrude(height = 100.0000000000) {
						polygon(paths = [[0, 1, 2, 3, 4, 5, 6, 7, 8, 9, 10, 11, 12, 13]], points = [[2445, 255], [2445, 1495], [1430, 1495], [1430, 2465], [1980, 2465], [1980, 1665], [2650, 1665], [2650, 2465], [3135, 2465], [3135, 1495], [2660, 1495], [2660, 595], [3135, 595], [3135, 255]]);
					}
				}
			}
			color(c = [0.9000000000, 0.6000000000, 0.6000000000]) {
				translate(v = [0, 0, 2176.1000000000]) {
					linear_extrude(height = 100.0000000000) {
						polygon(paths = [[0, 1, 2, 3, 4, 5, 6, 7, 8, 9, 10, 11]], points = [[85, 1795], [85, 2635], [0, 2635], [0, 2805], [3220, 2805], [3220, 2635], [2480, 2635], [2480, 1835], [2150, 1835], [2150, 2635], [780, 2635], [780, 1795]]);
					}
				}
			}
			color(c = [0.5000000000, 0.5000000000, 0.5000000000]) {
				translate(v = [0, 0, 2276.1000000000]) {
					linear_extrude(height = 340.0000000000) {
						polygon(paths = [[0, 1, 2, 3]], points = [[145, -85], [145, 85], [315, 85], [315, -85]]);
					}
				}
			}
			color(c = [0.5000000000, 0.5000000000, 0.5000000000]) {
				translate(v = [0, 0, 2276.1000000000]) {
					linear_extrude(height = 340.0000000000) {
						polygon(paths = [[0, 1, 2, 3]], points = [[605, -85], [605, 85], [775, 85], [775, -85]]);
					}
				}
			}
			color(c = [0.5000000000, 0.5000000000, 0.5000000000]) {
				translate(v = [0, 0, 2276.1000000000]) {
					linear_extrude(height = 340.0000000000) {
						polygon(paths = [[0, 1, 2, 3]], points = [[1065, -85], [1065, 85], [1235, 85], [1235, -85]]);
					}
				}
			}
			color(c = [0.5000000000, 0.5000000000, 0.5000000000]) {
				translate(v = [0, 0, 2276.1000000000]) {
					linear_extrude(height = 340.0000000000) {
						polygon(paths = [[0, 1, 2, 3]], points = [[1525, -85], [1525, 85], [1695, 85], [1695, -85]]);
					}
				}
			}
			color(c = [0.5000000000, 0.5000000000, 0.5000000000]) {
				translate(v = [0, 0, 2276.1000000000]) {
					linear_extrude(height = 340.0000000000) {
						polygon(paths = [[0, 1, 2, 3]], points = [[1985, -85], [1985, 85], [2155, 85], [2155, -85]]);
					}
				}
			}
			color(c = [0.5000000000, 0.5000000000, 0.5000000000]) {
				translate(v = [0, 0, 2276.1000000000]) {
					linear_extrude(height = 340.0000000000) {
						polygon(paths = [[0, 1, 2, 3]], points = [[2445, -85], [2445, 85], [2615, 85], [2615, -85]]);
					}
				}
			}
			color(c = [0.5000000000, 0.5000000000, 0.5000000000]) {
				translate(v = [0, 0, 2276.1000000000]) {
					linear_extrude(height = 340.0000000000) {
						polygon(paths = [[0, 1, 2, 3]], points = [[2905, -85], [2905, 85], [3075, 85], [3075, -85]]);
					}
				}
			}
			color(c = [0.5000000000, 0.5000000000, 0.5000000000]) {
				translate(v = [0, 0, 2276.1000000000]) {
					linear_extrude(height = 340.0000000000) {
						polygon(paths = [[0, 1, 2, 3]], points = [[145, 2635], [145, 2805], [315, 2805], [315, 2635]]);
					}
				}
			}
			color(c = [0.5000000000, 0.5000000000, 0.5000000000]) {
				translate(v = [0, 0, 2276.1000000000]) {
					linear_extrude(height = 340.0000000000) {
						polygon(paths = [[0, 1, 2, 3]], points = [[605, 2635], [605, 2805], [775, 2805], [775, 2635]]);
					}
				}
			}
			color(c = [0.5000000000, 0.5000000000, 0.5000000000]) {
				translate(v = [0, 0, 2276.1000000000]) {
					linear_extrude(height = 340.0000000000) {
						polygon(paths = [[0, 1, 2, 3]], points = [[1065, 2635], [1065, 2805], [1235, 2805], [1235, 2635]]);
					}
				}
			}
			color(c = [0.5000000000, 0.5000000000, 0.5000000000]) {
				translate(v = [0, 0, 2276.1000000000]) {
					linear_extrude(height = 340.0000000000) {
						polygon(paths = [[0, 1, 2, 3]], points = [[1525, 2635], [1525, 2805], [1695, 2805], [1695, 2635]]);
					}
				}
			}
			color(c = [0.5000000000, 0.5000000000, 0.5000000000]) {
				translate(v = [0, 0, 2276.1000000000]) {
					linear_extrude(height = 340.0000000000) {
						polygon(paths = [[0, 1, 2, 3]], points = [[1985, 2635], [1985, 2805], [2155, 2805], [2155, 2635]]);
					}
				}
			}
			color(c = [0.5000000000, 0.5000000000, 0.5000000000]) {
				translate(v = [0, 0, 2276.1000000000]) {
					linear_extrude(height = 340.0000000000) {
						polygon(paths = [[0, 1, 2, 3]], points = [[2445, 2635], [2445, 2805], [2615, 2805], [2615, 2635]]);
					}
				}
			}
			color(c = [0.5000000000, 0.5000000000, 0.5000000000]) {
				translate(v = [0, 0, 2276.1000000000]) {
					linear_extrude(height = 340.0000000000) {
						polygon(paths = [[0, 1, 2, 3]], points = [[2905, 2635], [2905, 2805], [3075, 2805], [3075, 2635]]);
					}
				}
			}
			color(c = [0.3000000000, 0.3000000000, 1]) {
				translate(v = [0, 0, 2616.1000000000]) {
					linear_extrude(height = 360.0000000000) {
						polygon(paths = [[0, 1, 2, 3]], points = [[0, -240], [0, 240], [3220, 240], [3220, -240]]);
					}
				}
			}
			color(c = [0.3000000000, 0.3000000000, 1]) {
				translate(v = [0, 0, 2616.1000000000]) {
					linear_extrude(height = 360.0000000000) {
						polygon(paths = [[0, 1, 2, 3]], points = [[0, 2480], [0, 2960], [3220, 2960], [3220, 2480]]);
					}
				}
			}
		}
	}
}
